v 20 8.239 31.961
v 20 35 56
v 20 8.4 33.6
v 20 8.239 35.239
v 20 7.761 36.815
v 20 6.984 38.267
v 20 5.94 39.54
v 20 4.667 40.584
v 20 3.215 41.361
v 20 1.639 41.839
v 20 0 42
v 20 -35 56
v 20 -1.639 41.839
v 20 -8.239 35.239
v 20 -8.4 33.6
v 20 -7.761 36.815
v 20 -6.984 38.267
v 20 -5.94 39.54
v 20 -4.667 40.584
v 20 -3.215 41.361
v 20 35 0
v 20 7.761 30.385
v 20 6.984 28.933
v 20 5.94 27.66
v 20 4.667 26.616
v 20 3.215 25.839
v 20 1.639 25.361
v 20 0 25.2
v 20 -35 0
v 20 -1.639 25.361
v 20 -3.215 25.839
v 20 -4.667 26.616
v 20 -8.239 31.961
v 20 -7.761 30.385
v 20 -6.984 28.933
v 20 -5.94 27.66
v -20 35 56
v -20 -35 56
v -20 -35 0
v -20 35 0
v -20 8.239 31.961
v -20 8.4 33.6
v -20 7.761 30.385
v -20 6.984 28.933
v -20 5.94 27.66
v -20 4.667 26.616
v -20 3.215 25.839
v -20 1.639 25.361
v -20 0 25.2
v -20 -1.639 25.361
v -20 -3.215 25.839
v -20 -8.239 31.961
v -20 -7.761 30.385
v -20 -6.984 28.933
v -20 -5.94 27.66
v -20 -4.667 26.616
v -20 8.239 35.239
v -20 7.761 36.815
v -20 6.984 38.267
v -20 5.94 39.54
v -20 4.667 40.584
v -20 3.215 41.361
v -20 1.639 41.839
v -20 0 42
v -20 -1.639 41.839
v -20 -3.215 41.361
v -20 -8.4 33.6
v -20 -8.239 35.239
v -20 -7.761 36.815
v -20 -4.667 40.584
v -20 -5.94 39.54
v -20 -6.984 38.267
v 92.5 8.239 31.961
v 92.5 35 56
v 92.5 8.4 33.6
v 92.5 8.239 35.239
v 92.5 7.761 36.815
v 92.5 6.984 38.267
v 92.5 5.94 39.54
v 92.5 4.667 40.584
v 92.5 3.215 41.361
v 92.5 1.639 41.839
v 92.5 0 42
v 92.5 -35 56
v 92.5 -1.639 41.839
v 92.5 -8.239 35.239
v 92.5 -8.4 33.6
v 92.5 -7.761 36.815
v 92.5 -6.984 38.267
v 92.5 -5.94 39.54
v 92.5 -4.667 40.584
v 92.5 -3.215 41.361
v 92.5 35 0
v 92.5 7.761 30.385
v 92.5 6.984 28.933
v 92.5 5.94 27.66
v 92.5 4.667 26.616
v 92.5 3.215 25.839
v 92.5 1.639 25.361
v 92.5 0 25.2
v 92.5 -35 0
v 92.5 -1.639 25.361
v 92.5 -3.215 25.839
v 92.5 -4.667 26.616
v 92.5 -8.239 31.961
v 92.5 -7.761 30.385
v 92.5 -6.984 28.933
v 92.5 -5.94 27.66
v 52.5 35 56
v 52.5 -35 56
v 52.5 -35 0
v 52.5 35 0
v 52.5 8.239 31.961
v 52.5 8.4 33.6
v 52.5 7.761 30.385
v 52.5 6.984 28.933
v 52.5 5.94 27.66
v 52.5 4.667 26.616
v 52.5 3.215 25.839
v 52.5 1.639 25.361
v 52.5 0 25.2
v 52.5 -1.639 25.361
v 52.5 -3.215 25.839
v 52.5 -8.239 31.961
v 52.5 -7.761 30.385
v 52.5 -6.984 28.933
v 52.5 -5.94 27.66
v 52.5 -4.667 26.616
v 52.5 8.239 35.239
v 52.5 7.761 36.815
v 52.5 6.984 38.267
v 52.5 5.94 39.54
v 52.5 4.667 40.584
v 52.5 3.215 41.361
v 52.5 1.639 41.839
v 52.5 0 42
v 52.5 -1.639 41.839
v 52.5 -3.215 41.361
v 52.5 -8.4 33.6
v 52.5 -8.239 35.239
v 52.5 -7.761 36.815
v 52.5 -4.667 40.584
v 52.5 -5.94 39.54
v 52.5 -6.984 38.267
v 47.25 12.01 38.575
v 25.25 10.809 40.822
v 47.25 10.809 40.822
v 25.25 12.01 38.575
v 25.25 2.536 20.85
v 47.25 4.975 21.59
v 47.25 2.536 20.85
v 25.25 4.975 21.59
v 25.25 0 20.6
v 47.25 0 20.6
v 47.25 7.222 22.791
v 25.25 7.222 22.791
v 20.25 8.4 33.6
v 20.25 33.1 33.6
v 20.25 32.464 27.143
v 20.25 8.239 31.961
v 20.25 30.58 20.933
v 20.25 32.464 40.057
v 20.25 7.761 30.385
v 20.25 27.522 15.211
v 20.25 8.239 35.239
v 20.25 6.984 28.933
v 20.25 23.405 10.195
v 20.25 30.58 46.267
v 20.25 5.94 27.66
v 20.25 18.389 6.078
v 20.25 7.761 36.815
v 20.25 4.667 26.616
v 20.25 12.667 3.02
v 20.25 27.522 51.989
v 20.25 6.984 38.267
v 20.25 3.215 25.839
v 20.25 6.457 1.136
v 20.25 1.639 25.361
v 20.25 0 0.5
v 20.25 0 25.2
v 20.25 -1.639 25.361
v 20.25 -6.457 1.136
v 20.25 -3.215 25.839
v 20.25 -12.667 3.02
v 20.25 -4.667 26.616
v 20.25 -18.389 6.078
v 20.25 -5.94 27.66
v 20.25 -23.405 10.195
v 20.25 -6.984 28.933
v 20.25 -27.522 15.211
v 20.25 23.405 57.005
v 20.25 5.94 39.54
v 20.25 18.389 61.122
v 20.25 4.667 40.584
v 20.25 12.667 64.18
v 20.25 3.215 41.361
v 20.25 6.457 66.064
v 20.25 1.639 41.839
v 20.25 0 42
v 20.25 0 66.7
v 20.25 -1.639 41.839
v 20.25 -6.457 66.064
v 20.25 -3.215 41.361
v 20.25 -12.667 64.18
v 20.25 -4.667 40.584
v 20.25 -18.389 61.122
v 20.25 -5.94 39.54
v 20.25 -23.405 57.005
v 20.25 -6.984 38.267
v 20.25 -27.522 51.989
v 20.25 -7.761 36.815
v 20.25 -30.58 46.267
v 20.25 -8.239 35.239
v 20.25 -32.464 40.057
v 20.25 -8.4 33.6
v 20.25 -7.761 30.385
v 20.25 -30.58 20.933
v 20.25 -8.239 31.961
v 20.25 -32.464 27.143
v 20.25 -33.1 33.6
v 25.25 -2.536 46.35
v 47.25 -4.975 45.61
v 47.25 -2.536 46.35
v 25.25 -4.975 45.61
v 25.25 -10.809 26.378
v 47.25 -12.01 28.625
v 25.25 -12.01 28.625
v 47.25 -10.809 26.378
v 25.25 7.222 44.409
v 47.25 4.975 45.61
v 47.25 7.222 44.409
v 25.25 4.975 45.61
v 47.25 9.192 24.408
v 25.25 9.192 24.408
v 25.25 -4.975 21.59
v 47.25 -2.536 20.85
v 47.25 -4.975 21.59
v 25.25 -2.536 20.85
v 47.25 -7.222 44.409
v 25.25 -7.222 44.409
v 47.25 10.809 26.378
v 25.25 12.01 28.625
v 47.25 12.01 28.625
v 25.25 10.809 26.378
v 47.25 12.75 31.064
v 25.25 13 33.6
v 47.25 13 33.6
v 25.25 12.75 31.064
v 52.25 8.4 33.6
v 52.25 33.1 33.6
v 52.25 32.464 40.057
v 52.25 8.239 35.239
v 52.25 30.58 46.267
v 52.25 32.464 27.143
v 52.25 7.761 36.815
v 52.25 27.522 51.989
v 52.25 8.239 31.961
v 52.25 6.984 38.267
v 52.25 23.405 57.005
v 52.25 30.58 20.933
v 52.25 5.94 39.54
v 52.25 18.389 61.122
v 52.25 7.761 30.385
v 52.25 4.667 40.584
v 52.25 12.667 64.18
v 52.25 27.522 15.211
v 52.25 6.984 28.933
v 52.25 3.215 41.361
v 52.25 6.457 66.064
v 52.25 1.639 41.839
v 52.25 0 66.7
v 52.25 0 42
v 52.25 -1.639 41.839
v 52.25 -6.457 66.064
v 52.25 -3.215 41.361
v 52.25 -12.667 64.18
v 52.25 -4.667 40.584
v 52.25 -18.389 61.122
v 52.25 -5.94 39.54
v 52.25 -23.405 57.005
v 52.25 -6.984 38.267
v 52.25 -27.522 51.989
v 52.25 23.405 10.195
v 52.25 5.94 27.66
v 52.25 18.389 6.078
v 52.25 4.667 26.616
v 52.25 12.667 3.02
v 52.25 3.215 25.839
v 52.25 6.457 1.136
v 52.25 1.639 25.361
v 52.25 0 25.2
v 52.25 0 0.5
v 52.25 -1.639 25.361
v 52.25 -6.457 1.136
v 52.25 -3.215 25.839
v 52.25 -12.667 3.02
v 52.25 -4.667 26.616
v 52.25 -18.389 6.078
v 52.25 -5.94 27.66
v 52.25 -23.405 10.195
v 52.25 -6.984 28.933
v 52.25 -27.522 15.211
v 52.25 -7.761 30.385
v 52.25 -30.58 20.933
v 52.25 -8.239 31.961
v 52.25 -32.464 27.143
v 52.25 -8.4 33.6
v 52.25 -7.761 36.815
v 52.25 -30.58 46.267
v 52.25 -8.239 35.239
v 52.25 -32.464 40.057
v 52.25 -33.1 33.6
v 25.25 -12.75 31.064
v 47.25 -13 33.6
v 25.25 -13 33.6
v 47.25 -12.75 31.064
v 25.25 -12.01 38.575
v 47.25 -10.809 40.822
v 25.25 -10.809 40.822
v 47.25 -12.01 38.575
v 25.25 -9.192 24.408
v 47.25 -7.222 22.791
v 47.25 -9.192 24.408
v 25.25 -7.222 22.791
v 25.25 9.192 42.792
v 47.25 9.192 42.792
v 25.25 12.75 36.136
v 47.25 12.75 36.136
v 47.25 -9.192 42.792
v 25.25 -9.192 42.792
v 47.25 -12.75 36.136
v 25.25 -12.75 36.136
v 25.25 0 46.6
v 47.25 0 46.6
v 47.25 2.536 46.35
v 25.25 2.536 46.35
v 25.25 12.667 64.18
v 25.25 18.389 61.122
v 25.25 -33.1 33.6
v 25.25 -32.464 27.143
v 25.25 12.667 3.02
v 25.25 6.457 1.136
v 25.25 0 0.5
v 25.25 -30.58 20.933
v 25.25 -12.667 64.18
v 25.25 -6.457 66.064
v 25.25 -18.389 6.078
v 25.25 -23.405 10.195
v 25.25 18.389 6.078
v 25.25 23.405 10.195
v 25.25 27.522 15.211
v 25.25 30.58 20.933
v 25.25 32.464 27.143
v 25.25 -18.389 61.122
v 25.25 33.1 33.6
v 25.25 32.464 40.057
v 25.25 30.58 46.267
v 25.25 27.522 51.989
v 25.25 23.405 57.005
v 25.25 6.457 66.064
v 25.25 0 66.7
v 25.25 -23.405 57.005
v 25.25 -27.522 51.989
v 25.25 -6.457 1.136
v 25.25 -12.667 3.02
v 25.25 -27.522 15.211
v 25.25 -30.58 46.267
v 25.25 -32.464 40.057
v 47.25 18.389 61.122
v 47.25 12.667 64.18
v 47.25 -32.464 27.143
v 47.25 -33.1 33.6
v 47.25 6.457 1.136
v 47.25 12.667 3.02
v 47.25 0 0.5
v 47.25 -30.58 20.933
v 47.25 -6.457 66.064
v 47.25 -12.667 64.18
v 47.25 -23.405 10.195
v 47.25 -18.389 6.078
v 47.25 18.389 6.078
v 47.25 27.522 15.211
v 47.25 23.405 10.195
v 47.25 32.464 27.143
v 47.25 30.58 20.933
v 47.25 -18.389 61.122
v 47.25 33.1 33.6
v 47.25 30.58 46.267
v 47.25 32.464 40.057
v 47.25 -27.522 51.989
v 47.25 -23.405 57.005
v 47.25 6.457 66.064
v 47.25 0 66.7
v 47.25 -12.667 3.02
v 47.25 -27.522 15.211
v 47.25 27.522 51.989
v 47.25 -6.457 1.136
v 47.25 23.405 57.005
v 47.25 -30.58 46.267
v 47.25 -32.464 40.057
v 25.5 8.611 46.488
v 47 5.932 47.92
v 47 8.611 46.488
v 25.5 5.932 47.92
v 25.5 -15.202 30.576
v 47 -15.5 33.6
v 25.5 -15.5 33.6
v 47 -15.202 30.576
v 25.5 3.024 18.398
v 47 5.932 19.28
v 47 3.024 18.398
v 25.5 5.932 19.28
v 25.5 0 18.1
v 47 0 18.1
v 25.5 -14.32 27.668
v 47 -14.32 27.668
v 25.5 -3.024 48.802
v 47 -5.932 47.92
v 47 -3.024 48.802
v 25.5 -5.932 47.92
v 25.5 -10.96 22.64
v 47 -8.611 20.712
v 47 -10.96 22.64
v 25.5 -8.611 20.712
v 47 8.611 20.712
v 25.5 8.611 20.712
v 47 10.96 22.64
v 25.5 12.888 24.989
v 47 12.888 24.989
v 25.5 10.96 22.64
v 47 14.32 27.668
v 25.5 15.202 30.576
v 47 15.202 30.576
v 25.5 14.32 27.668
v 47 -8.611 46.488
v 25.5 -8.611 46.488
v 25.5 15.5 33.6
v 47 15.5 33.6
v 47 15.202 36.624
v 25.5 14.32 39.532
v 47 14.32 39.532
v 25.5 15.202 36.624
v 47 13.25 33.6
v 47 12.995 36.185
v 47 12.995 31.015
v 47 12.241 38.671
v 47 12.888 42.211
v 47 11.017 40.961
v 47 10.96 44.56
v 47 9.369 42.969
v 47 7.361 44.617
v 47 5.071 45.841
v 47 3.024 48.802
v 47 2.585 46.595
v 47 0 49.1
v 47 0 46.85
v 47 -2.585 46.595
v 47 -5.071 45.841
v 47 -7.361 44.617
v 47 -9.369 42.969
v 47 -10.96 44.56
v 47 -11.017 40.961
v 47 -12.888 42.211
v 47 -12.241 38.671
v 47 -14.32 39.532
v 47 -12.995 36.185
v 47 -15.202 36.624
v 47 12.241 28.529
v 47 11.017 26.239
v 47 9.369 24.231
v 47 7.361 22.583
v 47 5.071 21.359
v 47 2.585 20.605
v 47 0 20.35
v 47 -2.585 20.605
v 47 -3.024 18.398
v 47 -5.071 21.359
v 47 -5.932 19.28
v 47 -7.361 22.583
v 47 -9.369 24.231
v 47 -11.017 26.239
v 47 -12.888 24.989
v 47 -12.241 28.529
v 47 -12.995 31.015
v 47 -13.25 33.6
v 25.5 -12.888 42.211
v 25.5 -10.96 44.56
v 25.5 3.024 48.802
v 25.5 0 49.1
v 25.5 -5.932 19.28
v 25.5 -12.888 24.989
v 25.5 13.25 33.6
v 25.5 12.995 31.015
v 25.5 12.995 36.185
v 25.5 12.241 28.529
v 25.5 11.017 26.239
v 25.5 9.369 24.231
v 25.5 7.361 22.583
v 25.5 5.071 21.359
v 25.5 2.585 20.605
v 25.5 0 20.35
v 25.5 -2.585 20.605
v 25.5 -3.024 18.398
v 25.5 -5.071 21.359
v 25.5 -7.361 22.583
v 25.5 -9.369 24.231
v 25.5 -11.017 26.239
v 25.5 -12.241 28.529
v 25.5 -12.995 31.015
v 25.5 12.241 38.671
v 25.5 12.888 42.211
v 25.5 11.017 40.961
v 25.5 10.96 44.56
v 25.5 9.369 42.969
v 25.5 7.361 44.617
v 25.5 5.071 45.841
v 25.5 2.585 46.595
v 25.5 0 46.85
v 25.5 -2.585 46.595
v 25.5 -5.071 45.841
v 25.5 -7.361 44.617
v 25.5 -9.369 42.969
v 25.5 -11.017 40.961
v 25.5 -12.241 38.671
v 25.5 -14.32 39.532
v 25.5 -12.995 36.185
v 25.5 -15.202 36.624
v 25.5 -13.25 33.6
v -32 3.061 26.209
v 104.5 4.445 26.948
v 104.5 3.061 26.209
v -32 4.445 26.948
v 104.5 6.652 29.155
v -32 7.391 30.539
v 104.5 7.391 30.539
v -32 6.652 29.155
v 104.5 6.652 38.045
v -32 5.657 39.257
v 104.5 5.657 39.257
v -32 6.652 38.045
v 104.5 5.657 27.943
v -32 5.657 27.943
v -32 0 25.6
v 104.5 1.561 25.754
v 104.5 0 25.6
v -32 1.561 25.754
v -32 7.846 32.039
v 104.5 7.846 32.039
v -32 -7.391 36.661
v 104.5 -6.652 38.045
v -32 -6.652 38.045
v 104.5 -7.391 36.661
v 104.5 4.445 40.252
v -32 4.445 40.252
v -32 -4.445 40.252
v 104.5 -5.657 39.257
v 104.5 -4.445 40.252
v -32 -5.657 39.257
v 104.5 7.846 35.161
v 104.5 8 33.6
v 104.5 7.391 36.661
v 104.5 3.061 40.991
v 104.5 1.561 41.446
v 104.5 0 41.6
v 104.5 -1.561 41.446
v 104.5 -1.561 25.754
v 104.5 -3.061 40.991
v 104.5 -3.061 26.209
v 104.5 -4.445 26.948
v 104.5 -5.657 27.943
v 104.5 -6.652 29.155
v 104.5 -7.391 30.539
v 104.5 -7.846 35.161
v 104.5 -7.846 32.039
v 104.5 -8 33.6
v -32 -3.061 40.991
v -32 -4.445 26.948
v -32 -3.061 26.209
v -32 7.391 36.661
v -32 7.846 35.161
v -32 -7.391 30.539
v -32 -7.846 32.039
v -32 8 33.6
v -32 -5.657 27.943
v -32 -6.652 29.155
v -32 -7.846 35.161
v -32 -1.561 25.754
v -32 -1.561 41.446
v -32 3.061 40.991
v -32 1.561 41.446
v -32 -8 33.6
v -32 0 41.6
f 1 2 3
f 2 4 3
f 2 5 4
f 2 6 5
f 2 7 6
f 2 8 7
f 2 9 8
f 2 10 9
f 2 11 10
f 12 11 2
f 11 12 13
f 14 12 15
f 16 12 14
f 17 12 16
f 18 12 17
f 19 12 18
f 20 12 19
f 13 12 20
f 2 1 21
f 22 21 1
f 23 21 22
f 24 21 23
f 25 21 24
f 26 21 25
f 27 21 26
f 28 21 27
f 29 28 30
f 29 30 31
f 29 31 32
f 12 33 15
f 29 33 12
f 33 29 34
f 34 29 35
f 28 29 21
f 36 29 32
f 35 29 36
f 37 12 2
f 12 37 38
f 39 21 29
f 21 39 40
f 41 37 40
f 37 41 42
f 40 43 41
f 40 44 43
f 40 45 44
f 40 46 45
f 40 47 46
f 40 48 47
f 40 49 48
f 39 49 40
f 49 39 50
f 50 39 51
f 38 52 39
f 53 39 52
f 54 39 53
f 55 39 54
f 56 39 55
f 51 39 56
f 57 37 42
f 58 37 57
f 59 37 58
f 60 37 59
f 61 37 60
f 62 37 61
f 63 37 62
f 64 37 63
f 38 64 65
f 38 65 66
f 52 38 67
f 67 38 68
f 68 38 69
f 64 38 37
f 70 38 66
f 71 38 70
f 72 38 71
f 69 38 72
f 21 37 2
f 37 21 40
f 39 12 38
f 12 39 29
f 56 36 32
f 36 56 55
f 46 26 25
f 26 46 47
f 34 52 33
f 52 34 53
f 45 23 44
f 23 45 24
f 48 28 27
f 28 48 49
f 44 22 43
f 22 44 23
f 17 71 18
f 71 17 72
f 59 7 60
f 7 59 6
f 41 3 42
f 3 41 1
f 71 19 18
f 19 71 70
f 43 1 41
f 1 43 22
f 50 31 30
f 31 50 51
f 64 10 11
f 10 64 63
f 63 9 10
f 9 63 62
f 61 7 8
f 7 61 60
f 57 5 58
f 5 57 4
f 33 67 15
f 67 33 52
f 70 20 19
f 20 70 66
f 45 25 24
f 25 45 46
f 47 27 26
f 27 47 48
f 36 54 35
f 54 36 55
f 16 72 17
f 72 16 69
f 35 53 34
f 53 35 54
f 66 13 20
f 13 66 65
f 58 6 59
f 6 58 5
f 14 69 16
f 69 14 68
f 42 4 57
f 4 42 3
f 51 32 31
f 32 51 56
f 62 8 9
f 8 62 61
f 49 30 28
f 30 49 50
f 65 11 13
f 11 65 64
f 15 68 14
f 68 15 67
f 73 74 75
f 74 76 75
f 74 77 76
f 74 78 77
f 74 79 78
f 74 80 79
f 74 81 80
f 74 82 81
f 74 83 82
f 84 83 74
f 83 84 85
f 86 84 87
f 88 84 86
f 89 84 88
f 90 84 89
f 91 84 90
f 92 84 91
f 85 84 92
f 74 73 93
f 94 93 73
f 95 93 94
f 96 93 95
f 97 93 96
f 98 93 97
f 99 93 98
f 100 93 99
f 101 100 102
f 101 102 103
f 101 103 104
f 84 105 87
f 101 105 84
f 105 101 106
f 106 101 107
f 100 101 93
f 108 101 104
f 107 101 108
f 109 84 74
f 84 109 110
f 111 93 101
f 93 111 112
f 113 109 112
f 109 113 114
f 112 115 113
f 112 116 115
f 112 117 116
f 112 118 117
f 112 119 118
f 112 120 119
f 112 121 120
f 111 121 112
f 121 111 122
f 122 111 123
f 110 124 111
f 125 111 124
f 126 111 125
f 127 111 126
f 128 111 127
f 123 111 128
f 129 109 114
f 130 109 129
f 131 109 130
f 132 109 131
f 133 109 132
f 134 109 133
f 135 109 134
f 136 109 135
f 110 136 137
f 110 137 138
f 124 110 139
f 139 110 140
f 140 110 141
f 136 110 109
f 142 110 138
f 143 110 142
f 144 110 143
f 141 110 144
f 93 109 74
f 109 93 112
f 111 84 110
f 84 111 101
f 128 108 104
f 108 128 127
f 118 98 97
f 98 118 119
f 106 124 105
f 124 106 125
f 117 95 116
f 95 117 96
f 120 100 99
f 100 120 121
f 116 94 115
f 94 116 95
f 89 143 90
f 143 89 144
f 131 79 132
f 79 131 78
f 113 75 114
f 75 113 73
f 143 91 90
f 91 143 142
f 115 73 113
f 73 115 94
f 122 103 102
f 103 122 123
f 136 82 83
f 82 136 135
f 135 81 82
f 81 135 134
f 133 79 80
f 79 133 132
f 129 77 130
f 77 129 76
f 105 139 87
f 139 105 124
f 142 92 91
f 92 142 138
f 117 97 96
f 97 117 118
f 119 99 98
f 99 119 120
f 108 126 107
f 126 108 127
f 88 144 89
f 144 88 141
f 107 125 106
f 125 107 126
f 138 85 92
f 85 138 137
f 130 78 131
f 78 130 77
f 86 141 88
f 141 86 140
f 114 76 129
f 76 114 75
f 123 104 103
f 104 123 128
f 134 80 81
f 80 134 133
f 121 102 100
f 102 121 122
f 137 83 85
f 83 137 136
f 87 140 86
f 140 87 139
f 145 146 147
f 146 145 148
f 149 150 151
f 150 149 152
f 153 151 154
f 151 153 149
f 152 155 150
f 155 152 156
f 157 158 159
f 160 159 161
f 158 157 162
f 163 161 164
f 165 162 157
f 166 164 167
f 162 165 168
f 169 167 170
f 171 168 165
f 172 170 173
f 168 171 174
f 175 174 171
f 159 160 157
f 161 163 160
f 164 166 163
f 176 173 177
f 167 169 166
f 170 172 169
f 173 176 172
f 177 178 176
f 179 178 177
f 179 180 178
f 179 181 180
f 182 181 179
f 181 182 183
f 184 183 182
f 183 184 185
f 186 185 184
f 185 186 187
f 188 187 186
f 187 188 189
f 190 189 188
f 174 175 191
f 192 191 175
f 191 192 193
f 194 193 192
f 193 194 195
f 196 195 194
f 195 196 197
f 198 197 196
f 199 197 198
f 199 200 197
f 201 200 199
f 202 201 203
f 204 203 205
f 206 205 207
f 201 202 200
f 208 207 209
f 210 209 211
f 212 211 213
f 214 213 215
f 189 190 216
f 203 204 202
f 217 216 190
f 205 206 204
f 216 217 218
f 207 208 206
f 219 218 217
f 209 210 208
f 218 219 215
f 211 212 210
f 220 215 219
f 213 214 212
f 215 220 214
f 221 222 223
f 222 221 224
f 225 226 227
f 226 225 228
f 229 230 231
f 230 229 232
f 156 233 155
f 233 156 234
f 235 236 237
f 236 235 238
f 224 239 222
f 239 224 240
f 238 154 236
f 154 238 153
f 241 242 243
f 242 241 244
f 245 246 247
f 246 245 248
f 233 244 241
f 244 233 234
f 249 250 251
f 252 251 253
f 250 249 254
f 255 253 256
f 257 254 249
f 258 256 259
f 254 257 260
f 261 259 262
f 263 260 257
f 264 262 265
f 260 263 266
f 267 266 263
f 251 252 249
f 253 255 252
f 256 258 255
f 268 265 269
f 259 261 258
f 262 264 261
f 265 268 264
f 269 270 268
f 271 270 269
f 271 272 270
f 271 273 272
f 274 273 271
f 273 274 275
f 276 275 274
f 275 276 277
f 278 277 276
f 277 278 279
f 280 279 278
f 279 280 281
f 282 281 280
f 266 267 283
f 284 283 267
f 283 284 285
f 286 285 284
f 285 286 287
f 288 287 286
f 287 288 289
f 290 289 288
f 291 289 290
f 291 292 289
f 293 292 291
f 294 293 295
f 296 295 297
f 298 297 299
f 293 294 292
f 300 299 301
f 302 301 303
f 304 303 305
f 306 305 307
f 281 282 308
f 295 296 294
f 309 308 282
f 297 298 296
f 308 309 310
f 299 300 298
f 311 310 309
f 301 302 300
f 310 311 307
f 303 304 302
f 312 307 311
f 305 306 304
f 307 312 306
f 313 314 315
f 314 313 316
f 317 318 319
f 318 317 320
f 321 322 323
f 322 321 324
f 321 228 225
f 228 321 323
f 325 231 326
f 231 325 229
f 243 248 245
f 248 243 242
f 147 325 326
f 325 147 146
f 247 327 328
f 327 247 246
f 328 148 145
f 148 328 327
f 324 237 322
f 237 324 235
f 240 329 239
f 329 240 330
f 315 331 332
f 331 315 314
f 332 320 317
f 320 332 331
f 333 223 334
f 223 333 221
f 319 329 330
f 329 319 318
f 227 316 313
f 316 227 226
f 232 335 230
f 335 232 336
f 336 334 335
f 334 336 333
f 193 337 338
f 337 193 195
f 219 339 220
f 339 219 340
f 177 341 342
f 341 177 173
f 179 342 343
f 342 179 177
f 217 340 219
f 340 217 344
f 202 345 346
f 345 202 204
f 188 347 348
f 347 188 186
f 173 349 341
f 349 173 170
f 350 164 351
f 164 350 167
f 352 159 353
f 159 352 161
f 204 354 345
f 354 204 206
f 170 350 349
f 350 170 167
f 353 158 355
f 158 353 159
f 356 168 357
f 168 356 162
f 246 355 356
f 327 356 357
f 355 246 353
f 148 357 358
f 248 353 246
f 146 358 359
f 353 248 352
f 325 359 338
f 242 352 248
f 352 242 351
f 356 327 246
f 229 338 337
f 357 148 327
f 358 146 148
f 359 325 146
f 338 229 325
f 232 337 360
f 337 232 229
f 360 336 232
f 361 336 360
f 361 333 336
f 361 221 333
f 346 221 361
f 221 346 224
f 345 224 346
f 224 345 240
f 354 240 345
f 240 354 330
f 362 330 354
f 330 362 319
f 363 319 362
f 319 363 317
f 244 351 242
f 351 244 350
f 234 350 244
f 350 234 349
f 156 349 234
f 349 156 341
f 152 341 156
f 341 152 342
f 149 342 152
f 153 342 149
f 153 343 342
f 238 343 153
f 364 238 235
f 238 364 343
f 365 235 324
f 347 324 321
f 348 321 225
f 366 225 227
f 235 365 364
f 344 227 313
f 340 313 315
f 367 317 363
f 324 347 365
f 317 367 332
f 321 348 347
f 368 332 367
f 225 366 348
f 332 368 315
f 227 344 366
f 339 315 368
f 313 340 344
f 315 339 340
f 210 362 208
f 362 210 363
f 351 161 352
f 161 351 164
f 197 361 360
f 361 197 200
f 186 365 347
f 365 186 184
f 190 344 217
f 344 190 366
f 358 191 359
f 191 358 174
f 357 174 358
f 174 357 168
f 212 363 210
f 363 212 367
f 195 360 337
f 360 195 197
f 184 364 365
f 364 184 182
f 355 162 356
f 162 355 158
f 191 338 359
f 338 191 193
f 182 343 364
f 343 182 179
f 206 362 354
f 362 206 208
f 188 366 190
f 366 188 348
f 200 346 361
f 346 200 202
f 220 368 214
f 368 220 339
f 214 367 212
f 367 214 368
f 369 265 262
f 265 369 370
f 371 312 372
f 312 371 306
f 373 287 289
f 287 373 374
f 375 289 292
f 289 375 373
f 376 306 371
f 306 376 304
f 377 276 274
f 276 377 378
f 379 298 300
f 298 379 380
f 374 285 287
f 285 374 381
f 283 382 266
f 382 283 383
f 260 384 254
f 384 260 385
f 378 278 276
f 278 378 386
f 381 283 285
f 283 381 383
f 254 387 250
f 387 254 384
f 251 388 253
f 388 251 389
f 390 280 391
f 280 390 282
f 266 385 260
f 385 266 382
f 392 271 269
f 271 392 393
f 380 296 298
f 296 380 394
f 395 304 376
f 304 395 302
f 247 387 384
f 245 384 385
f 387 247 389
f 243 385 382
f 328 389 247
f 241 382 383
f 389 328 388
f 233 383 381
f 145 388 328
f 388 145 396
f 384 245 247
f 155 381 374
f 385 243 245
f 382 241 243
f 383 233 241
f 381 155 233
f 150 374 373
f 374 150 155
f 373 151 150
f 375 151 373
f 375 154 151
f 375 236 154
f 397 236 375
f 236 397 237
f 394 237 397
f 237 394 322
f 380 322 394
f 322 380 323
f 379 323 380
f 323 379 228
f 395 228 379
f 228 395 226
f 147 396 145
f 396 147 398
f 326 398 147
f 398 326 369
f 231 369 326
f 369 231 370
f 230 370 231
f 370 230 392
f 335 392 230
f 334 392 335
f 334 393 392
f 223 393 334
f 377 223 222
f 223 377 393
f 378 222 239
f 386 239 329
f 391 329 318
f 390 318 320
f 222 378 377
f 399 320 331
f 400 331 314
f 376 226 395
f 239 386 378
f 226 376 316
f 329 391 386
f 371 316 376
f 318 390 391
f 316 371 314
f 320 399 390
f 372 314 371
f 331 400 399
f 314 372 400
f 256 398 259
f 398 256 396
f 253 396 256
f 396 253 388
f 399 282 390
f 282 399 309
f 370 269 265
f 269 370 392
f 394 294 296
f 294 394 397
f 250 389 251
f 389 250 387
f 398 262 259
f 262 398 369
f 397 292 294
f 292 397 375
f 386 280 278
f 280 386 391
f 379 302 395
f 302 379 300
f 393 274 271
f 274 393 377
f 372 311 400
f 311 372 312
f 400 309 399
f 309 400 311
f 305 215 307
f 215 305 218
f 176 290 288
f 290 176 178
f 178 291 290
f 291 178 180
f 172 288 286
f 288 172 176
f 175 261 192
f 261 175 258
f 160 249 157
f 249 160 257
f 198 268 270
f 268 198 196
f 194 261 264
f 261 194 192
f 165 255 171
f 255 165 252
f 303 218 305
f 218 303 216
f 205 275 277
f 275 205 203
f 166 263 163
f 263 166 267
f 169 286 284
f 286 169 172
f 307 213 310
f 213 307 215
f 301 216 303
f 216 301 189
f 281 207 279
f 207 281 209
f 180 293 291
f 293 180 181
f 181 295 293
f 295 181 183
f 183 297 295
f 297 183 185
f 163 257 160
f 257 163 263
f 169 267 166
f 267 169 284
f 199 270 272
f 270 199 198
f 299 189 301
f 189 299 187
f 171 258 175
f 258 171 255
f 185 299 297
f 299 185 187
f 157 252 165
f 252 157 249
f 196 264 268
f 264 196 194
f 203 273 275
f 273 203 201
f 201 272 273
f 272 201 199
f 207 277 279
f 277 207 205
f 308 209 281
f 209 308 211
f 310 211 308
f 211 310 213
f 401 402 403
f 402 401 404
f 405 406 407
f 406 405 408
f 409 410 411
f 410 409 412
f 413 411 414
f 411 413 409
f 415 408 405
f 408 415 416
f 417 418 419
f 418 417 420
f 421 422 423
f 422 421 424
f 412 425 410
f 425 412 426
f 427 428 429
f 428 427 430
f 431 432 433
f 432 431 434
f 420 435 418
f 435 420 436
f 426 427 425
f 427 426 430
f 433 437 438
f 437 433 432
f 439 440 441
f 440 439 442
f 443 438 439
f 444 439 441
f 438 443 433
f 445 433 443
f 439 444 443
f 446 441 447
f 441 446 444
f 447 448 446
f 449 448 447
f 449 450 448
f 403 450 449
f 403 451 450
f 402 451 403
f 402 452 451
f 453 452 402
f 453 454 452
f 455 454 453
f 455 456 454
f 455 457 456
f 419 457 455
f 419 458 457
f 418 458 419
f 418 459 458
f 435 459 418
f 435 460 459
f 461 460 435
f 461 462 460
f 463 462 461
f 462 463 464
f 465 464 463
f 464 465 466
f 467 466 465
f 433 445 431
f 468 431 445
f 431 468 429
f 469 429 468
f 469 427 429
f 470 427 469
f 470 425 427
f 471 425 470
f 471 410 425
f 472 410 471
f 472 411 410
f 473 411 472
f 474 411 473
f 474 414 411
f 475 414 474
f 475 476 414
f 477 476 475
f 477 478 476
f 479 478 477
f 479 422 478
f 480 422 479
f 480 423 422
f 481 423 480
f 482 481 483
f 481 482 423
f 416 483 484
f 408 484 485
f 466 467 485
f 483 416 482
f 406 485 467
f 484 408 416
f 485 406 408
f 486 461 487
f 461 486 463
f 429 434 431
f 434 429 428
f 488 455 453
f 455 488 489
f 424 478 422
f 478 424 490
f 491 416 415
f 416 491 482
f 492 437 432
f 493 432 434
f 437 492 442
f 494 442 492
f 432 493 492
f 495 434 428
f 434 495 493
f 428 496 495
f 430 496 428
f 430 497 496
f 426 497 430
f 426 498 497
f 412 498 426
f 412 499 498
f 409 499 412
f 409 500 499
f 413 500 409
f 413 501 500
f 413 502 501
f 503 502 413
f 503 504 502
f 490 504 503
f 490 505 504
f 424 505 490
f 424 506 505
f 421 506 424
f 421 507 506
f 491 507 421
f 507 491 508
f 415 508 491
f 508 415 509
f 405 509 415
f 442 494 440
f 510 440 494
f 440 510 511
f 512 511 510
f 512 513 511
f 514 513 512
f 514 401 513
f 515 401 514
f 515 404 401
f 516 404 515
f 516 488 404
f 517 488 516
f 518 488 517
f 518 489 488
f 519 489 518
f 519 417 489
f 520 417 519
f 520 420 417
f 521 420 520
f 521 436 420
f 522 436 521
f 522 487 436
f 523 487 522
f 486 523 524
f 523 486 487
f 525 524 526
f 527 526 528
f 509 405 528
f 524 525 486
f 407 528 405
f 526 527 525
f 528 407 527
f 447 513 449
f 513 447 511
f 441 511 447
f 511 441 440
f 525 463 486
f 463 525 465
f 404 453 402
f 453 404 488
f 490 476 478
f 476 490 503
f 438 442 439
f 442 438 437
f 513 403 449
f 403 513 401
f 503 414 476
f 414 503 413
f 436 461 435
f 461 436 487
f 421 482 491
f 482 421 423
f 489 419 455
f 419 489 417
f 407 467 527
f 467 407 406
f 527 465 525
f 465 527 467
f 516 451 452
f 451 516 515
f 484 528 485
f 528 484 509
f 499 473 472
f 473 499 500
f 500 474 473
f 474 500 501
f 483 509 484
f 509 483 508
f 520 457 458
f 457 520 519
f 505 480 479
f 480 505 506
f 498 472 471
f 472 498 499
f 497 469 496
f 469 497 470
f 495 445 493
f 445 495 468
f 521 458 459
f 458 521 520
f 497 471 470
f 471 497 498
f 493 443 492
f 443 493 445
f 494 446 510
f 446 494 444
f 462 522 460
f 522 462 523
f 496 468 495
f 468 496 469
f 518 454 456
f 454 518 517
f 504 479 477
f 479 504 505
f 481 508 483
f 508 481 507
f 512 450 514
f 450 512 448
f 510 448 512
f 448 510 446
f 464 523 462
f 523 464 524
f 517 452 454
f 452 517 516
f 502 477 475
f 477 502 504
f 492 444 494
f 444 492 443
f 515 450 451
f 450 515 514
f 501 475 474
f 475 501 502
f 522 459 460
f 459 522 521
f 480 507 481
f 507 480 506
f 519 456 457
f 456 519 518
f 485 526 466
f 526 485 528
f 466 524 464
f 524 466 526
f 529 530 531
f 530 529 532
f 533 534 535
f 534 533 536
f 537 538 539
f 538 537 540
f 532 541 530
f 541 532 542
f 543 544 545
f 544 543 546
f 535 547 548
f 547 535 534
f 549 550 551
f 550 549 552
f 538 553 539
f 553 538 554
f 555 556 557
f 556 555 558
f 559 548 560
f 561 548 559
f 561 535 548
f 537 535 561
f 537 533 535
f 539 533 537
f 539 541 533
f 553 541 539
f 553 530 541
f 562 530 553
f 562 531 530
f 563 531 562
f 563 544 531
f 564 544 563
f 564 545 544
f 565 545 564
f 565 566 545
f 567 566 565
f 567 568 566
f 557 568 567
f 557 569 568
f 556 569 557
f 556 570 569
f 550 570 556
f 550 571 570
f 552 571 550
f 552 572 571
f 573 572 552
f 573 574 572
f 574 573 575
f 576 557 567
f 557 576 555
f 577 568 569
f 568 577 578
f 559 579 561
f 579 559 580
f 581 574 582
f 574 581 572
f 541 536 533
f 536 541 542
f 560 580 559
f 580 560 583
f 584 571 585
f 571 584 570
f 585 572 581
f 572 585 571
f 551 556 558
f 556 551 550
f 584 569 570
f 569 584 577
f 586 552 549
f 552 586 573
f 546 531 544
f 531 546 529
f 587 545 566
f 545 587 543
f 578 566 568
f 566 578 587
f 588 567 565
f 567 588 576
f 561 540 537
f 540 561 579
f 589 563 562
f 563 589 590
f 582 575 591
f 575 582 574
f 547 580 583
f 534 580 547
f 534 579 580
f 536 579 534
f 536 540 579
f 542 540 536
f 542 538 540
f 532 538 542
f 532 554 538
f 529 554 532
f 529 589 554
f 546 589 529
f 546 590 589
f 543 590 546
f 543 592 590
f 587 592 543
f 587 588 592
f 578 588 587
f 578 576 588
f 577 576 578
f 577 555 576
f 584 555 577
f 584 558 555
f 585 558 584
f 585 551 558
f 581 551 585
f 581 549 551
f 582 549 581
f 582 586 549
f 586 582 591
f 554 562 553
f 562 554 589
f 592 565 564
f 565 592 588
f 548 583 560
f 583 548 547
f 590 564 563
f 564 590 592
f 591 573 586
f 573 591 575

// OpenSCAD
$fn = 32;

// ------------------------------------------------------------------------
// Pulley assembly: d66.2 pulley with a belt, shaft d16
// Every part is its own module, assembly() places them once.
// ------------------------------------------------------------------------

// --- part 1 ---
module support1() {
  difference() {
    translate([-20, -35, 0]) cube([40, 70, 56]);
    translate([0, 0, 33.6]) rotate([0, 90, 0]) cylinder(h = 42, d = 16.8, center = true);
  }
}

// --- part 2 ---
module support2() {
  difference() {
    translate([-20, -35, 0]) cube([40, 70, 56]);
    translate([0, 0, 33.6]) rotate([0, 90, 0]) cylinder(h = 42, d = 16.8, center = true);
  }
}

// --- part 3 ---
module shaft() {
  translate([0, 0, -68.25]) cylinder(h = 136.5, d = 16);
}

// --- part 4 ---
module pulley() {
  difference() {
    union() {
      cylinder(h = 32, d = 26);
      cylinder(h = 5, d = 66.2);
      translate([0, 0, 27]) cylinder(h = 5, d = 66.2);
    }
    translate([0, 0, -1]) cylinder(h = 34, d = 16.8);
  }
}

// --- part 5 ---
module belt() {
  difference() {
      translate([0, 0, 0]) cylinder(h = 21.5, d = 31);
      translate([0, 0, -1]) cylinder(h = 23.5, d = 26.5);
    }
}

// --- assembly ---
module assembly() {
  translate([0, 0, 0]) rotate([0, 0, 0]) support1();
  translate([72.5, 0, 0]) rotate([0, 0, 0]) support2();
  translate([36.25, 0, 33.6]) rotate([0, 90, 0]) shaft();
  translate([20.25, 0, 33.6]) rotate([0, 90, 0]) pulley();
  translate([25.5, 0, 33.6]) rotate([0, 90, 0]) belt();
}

assembly();
